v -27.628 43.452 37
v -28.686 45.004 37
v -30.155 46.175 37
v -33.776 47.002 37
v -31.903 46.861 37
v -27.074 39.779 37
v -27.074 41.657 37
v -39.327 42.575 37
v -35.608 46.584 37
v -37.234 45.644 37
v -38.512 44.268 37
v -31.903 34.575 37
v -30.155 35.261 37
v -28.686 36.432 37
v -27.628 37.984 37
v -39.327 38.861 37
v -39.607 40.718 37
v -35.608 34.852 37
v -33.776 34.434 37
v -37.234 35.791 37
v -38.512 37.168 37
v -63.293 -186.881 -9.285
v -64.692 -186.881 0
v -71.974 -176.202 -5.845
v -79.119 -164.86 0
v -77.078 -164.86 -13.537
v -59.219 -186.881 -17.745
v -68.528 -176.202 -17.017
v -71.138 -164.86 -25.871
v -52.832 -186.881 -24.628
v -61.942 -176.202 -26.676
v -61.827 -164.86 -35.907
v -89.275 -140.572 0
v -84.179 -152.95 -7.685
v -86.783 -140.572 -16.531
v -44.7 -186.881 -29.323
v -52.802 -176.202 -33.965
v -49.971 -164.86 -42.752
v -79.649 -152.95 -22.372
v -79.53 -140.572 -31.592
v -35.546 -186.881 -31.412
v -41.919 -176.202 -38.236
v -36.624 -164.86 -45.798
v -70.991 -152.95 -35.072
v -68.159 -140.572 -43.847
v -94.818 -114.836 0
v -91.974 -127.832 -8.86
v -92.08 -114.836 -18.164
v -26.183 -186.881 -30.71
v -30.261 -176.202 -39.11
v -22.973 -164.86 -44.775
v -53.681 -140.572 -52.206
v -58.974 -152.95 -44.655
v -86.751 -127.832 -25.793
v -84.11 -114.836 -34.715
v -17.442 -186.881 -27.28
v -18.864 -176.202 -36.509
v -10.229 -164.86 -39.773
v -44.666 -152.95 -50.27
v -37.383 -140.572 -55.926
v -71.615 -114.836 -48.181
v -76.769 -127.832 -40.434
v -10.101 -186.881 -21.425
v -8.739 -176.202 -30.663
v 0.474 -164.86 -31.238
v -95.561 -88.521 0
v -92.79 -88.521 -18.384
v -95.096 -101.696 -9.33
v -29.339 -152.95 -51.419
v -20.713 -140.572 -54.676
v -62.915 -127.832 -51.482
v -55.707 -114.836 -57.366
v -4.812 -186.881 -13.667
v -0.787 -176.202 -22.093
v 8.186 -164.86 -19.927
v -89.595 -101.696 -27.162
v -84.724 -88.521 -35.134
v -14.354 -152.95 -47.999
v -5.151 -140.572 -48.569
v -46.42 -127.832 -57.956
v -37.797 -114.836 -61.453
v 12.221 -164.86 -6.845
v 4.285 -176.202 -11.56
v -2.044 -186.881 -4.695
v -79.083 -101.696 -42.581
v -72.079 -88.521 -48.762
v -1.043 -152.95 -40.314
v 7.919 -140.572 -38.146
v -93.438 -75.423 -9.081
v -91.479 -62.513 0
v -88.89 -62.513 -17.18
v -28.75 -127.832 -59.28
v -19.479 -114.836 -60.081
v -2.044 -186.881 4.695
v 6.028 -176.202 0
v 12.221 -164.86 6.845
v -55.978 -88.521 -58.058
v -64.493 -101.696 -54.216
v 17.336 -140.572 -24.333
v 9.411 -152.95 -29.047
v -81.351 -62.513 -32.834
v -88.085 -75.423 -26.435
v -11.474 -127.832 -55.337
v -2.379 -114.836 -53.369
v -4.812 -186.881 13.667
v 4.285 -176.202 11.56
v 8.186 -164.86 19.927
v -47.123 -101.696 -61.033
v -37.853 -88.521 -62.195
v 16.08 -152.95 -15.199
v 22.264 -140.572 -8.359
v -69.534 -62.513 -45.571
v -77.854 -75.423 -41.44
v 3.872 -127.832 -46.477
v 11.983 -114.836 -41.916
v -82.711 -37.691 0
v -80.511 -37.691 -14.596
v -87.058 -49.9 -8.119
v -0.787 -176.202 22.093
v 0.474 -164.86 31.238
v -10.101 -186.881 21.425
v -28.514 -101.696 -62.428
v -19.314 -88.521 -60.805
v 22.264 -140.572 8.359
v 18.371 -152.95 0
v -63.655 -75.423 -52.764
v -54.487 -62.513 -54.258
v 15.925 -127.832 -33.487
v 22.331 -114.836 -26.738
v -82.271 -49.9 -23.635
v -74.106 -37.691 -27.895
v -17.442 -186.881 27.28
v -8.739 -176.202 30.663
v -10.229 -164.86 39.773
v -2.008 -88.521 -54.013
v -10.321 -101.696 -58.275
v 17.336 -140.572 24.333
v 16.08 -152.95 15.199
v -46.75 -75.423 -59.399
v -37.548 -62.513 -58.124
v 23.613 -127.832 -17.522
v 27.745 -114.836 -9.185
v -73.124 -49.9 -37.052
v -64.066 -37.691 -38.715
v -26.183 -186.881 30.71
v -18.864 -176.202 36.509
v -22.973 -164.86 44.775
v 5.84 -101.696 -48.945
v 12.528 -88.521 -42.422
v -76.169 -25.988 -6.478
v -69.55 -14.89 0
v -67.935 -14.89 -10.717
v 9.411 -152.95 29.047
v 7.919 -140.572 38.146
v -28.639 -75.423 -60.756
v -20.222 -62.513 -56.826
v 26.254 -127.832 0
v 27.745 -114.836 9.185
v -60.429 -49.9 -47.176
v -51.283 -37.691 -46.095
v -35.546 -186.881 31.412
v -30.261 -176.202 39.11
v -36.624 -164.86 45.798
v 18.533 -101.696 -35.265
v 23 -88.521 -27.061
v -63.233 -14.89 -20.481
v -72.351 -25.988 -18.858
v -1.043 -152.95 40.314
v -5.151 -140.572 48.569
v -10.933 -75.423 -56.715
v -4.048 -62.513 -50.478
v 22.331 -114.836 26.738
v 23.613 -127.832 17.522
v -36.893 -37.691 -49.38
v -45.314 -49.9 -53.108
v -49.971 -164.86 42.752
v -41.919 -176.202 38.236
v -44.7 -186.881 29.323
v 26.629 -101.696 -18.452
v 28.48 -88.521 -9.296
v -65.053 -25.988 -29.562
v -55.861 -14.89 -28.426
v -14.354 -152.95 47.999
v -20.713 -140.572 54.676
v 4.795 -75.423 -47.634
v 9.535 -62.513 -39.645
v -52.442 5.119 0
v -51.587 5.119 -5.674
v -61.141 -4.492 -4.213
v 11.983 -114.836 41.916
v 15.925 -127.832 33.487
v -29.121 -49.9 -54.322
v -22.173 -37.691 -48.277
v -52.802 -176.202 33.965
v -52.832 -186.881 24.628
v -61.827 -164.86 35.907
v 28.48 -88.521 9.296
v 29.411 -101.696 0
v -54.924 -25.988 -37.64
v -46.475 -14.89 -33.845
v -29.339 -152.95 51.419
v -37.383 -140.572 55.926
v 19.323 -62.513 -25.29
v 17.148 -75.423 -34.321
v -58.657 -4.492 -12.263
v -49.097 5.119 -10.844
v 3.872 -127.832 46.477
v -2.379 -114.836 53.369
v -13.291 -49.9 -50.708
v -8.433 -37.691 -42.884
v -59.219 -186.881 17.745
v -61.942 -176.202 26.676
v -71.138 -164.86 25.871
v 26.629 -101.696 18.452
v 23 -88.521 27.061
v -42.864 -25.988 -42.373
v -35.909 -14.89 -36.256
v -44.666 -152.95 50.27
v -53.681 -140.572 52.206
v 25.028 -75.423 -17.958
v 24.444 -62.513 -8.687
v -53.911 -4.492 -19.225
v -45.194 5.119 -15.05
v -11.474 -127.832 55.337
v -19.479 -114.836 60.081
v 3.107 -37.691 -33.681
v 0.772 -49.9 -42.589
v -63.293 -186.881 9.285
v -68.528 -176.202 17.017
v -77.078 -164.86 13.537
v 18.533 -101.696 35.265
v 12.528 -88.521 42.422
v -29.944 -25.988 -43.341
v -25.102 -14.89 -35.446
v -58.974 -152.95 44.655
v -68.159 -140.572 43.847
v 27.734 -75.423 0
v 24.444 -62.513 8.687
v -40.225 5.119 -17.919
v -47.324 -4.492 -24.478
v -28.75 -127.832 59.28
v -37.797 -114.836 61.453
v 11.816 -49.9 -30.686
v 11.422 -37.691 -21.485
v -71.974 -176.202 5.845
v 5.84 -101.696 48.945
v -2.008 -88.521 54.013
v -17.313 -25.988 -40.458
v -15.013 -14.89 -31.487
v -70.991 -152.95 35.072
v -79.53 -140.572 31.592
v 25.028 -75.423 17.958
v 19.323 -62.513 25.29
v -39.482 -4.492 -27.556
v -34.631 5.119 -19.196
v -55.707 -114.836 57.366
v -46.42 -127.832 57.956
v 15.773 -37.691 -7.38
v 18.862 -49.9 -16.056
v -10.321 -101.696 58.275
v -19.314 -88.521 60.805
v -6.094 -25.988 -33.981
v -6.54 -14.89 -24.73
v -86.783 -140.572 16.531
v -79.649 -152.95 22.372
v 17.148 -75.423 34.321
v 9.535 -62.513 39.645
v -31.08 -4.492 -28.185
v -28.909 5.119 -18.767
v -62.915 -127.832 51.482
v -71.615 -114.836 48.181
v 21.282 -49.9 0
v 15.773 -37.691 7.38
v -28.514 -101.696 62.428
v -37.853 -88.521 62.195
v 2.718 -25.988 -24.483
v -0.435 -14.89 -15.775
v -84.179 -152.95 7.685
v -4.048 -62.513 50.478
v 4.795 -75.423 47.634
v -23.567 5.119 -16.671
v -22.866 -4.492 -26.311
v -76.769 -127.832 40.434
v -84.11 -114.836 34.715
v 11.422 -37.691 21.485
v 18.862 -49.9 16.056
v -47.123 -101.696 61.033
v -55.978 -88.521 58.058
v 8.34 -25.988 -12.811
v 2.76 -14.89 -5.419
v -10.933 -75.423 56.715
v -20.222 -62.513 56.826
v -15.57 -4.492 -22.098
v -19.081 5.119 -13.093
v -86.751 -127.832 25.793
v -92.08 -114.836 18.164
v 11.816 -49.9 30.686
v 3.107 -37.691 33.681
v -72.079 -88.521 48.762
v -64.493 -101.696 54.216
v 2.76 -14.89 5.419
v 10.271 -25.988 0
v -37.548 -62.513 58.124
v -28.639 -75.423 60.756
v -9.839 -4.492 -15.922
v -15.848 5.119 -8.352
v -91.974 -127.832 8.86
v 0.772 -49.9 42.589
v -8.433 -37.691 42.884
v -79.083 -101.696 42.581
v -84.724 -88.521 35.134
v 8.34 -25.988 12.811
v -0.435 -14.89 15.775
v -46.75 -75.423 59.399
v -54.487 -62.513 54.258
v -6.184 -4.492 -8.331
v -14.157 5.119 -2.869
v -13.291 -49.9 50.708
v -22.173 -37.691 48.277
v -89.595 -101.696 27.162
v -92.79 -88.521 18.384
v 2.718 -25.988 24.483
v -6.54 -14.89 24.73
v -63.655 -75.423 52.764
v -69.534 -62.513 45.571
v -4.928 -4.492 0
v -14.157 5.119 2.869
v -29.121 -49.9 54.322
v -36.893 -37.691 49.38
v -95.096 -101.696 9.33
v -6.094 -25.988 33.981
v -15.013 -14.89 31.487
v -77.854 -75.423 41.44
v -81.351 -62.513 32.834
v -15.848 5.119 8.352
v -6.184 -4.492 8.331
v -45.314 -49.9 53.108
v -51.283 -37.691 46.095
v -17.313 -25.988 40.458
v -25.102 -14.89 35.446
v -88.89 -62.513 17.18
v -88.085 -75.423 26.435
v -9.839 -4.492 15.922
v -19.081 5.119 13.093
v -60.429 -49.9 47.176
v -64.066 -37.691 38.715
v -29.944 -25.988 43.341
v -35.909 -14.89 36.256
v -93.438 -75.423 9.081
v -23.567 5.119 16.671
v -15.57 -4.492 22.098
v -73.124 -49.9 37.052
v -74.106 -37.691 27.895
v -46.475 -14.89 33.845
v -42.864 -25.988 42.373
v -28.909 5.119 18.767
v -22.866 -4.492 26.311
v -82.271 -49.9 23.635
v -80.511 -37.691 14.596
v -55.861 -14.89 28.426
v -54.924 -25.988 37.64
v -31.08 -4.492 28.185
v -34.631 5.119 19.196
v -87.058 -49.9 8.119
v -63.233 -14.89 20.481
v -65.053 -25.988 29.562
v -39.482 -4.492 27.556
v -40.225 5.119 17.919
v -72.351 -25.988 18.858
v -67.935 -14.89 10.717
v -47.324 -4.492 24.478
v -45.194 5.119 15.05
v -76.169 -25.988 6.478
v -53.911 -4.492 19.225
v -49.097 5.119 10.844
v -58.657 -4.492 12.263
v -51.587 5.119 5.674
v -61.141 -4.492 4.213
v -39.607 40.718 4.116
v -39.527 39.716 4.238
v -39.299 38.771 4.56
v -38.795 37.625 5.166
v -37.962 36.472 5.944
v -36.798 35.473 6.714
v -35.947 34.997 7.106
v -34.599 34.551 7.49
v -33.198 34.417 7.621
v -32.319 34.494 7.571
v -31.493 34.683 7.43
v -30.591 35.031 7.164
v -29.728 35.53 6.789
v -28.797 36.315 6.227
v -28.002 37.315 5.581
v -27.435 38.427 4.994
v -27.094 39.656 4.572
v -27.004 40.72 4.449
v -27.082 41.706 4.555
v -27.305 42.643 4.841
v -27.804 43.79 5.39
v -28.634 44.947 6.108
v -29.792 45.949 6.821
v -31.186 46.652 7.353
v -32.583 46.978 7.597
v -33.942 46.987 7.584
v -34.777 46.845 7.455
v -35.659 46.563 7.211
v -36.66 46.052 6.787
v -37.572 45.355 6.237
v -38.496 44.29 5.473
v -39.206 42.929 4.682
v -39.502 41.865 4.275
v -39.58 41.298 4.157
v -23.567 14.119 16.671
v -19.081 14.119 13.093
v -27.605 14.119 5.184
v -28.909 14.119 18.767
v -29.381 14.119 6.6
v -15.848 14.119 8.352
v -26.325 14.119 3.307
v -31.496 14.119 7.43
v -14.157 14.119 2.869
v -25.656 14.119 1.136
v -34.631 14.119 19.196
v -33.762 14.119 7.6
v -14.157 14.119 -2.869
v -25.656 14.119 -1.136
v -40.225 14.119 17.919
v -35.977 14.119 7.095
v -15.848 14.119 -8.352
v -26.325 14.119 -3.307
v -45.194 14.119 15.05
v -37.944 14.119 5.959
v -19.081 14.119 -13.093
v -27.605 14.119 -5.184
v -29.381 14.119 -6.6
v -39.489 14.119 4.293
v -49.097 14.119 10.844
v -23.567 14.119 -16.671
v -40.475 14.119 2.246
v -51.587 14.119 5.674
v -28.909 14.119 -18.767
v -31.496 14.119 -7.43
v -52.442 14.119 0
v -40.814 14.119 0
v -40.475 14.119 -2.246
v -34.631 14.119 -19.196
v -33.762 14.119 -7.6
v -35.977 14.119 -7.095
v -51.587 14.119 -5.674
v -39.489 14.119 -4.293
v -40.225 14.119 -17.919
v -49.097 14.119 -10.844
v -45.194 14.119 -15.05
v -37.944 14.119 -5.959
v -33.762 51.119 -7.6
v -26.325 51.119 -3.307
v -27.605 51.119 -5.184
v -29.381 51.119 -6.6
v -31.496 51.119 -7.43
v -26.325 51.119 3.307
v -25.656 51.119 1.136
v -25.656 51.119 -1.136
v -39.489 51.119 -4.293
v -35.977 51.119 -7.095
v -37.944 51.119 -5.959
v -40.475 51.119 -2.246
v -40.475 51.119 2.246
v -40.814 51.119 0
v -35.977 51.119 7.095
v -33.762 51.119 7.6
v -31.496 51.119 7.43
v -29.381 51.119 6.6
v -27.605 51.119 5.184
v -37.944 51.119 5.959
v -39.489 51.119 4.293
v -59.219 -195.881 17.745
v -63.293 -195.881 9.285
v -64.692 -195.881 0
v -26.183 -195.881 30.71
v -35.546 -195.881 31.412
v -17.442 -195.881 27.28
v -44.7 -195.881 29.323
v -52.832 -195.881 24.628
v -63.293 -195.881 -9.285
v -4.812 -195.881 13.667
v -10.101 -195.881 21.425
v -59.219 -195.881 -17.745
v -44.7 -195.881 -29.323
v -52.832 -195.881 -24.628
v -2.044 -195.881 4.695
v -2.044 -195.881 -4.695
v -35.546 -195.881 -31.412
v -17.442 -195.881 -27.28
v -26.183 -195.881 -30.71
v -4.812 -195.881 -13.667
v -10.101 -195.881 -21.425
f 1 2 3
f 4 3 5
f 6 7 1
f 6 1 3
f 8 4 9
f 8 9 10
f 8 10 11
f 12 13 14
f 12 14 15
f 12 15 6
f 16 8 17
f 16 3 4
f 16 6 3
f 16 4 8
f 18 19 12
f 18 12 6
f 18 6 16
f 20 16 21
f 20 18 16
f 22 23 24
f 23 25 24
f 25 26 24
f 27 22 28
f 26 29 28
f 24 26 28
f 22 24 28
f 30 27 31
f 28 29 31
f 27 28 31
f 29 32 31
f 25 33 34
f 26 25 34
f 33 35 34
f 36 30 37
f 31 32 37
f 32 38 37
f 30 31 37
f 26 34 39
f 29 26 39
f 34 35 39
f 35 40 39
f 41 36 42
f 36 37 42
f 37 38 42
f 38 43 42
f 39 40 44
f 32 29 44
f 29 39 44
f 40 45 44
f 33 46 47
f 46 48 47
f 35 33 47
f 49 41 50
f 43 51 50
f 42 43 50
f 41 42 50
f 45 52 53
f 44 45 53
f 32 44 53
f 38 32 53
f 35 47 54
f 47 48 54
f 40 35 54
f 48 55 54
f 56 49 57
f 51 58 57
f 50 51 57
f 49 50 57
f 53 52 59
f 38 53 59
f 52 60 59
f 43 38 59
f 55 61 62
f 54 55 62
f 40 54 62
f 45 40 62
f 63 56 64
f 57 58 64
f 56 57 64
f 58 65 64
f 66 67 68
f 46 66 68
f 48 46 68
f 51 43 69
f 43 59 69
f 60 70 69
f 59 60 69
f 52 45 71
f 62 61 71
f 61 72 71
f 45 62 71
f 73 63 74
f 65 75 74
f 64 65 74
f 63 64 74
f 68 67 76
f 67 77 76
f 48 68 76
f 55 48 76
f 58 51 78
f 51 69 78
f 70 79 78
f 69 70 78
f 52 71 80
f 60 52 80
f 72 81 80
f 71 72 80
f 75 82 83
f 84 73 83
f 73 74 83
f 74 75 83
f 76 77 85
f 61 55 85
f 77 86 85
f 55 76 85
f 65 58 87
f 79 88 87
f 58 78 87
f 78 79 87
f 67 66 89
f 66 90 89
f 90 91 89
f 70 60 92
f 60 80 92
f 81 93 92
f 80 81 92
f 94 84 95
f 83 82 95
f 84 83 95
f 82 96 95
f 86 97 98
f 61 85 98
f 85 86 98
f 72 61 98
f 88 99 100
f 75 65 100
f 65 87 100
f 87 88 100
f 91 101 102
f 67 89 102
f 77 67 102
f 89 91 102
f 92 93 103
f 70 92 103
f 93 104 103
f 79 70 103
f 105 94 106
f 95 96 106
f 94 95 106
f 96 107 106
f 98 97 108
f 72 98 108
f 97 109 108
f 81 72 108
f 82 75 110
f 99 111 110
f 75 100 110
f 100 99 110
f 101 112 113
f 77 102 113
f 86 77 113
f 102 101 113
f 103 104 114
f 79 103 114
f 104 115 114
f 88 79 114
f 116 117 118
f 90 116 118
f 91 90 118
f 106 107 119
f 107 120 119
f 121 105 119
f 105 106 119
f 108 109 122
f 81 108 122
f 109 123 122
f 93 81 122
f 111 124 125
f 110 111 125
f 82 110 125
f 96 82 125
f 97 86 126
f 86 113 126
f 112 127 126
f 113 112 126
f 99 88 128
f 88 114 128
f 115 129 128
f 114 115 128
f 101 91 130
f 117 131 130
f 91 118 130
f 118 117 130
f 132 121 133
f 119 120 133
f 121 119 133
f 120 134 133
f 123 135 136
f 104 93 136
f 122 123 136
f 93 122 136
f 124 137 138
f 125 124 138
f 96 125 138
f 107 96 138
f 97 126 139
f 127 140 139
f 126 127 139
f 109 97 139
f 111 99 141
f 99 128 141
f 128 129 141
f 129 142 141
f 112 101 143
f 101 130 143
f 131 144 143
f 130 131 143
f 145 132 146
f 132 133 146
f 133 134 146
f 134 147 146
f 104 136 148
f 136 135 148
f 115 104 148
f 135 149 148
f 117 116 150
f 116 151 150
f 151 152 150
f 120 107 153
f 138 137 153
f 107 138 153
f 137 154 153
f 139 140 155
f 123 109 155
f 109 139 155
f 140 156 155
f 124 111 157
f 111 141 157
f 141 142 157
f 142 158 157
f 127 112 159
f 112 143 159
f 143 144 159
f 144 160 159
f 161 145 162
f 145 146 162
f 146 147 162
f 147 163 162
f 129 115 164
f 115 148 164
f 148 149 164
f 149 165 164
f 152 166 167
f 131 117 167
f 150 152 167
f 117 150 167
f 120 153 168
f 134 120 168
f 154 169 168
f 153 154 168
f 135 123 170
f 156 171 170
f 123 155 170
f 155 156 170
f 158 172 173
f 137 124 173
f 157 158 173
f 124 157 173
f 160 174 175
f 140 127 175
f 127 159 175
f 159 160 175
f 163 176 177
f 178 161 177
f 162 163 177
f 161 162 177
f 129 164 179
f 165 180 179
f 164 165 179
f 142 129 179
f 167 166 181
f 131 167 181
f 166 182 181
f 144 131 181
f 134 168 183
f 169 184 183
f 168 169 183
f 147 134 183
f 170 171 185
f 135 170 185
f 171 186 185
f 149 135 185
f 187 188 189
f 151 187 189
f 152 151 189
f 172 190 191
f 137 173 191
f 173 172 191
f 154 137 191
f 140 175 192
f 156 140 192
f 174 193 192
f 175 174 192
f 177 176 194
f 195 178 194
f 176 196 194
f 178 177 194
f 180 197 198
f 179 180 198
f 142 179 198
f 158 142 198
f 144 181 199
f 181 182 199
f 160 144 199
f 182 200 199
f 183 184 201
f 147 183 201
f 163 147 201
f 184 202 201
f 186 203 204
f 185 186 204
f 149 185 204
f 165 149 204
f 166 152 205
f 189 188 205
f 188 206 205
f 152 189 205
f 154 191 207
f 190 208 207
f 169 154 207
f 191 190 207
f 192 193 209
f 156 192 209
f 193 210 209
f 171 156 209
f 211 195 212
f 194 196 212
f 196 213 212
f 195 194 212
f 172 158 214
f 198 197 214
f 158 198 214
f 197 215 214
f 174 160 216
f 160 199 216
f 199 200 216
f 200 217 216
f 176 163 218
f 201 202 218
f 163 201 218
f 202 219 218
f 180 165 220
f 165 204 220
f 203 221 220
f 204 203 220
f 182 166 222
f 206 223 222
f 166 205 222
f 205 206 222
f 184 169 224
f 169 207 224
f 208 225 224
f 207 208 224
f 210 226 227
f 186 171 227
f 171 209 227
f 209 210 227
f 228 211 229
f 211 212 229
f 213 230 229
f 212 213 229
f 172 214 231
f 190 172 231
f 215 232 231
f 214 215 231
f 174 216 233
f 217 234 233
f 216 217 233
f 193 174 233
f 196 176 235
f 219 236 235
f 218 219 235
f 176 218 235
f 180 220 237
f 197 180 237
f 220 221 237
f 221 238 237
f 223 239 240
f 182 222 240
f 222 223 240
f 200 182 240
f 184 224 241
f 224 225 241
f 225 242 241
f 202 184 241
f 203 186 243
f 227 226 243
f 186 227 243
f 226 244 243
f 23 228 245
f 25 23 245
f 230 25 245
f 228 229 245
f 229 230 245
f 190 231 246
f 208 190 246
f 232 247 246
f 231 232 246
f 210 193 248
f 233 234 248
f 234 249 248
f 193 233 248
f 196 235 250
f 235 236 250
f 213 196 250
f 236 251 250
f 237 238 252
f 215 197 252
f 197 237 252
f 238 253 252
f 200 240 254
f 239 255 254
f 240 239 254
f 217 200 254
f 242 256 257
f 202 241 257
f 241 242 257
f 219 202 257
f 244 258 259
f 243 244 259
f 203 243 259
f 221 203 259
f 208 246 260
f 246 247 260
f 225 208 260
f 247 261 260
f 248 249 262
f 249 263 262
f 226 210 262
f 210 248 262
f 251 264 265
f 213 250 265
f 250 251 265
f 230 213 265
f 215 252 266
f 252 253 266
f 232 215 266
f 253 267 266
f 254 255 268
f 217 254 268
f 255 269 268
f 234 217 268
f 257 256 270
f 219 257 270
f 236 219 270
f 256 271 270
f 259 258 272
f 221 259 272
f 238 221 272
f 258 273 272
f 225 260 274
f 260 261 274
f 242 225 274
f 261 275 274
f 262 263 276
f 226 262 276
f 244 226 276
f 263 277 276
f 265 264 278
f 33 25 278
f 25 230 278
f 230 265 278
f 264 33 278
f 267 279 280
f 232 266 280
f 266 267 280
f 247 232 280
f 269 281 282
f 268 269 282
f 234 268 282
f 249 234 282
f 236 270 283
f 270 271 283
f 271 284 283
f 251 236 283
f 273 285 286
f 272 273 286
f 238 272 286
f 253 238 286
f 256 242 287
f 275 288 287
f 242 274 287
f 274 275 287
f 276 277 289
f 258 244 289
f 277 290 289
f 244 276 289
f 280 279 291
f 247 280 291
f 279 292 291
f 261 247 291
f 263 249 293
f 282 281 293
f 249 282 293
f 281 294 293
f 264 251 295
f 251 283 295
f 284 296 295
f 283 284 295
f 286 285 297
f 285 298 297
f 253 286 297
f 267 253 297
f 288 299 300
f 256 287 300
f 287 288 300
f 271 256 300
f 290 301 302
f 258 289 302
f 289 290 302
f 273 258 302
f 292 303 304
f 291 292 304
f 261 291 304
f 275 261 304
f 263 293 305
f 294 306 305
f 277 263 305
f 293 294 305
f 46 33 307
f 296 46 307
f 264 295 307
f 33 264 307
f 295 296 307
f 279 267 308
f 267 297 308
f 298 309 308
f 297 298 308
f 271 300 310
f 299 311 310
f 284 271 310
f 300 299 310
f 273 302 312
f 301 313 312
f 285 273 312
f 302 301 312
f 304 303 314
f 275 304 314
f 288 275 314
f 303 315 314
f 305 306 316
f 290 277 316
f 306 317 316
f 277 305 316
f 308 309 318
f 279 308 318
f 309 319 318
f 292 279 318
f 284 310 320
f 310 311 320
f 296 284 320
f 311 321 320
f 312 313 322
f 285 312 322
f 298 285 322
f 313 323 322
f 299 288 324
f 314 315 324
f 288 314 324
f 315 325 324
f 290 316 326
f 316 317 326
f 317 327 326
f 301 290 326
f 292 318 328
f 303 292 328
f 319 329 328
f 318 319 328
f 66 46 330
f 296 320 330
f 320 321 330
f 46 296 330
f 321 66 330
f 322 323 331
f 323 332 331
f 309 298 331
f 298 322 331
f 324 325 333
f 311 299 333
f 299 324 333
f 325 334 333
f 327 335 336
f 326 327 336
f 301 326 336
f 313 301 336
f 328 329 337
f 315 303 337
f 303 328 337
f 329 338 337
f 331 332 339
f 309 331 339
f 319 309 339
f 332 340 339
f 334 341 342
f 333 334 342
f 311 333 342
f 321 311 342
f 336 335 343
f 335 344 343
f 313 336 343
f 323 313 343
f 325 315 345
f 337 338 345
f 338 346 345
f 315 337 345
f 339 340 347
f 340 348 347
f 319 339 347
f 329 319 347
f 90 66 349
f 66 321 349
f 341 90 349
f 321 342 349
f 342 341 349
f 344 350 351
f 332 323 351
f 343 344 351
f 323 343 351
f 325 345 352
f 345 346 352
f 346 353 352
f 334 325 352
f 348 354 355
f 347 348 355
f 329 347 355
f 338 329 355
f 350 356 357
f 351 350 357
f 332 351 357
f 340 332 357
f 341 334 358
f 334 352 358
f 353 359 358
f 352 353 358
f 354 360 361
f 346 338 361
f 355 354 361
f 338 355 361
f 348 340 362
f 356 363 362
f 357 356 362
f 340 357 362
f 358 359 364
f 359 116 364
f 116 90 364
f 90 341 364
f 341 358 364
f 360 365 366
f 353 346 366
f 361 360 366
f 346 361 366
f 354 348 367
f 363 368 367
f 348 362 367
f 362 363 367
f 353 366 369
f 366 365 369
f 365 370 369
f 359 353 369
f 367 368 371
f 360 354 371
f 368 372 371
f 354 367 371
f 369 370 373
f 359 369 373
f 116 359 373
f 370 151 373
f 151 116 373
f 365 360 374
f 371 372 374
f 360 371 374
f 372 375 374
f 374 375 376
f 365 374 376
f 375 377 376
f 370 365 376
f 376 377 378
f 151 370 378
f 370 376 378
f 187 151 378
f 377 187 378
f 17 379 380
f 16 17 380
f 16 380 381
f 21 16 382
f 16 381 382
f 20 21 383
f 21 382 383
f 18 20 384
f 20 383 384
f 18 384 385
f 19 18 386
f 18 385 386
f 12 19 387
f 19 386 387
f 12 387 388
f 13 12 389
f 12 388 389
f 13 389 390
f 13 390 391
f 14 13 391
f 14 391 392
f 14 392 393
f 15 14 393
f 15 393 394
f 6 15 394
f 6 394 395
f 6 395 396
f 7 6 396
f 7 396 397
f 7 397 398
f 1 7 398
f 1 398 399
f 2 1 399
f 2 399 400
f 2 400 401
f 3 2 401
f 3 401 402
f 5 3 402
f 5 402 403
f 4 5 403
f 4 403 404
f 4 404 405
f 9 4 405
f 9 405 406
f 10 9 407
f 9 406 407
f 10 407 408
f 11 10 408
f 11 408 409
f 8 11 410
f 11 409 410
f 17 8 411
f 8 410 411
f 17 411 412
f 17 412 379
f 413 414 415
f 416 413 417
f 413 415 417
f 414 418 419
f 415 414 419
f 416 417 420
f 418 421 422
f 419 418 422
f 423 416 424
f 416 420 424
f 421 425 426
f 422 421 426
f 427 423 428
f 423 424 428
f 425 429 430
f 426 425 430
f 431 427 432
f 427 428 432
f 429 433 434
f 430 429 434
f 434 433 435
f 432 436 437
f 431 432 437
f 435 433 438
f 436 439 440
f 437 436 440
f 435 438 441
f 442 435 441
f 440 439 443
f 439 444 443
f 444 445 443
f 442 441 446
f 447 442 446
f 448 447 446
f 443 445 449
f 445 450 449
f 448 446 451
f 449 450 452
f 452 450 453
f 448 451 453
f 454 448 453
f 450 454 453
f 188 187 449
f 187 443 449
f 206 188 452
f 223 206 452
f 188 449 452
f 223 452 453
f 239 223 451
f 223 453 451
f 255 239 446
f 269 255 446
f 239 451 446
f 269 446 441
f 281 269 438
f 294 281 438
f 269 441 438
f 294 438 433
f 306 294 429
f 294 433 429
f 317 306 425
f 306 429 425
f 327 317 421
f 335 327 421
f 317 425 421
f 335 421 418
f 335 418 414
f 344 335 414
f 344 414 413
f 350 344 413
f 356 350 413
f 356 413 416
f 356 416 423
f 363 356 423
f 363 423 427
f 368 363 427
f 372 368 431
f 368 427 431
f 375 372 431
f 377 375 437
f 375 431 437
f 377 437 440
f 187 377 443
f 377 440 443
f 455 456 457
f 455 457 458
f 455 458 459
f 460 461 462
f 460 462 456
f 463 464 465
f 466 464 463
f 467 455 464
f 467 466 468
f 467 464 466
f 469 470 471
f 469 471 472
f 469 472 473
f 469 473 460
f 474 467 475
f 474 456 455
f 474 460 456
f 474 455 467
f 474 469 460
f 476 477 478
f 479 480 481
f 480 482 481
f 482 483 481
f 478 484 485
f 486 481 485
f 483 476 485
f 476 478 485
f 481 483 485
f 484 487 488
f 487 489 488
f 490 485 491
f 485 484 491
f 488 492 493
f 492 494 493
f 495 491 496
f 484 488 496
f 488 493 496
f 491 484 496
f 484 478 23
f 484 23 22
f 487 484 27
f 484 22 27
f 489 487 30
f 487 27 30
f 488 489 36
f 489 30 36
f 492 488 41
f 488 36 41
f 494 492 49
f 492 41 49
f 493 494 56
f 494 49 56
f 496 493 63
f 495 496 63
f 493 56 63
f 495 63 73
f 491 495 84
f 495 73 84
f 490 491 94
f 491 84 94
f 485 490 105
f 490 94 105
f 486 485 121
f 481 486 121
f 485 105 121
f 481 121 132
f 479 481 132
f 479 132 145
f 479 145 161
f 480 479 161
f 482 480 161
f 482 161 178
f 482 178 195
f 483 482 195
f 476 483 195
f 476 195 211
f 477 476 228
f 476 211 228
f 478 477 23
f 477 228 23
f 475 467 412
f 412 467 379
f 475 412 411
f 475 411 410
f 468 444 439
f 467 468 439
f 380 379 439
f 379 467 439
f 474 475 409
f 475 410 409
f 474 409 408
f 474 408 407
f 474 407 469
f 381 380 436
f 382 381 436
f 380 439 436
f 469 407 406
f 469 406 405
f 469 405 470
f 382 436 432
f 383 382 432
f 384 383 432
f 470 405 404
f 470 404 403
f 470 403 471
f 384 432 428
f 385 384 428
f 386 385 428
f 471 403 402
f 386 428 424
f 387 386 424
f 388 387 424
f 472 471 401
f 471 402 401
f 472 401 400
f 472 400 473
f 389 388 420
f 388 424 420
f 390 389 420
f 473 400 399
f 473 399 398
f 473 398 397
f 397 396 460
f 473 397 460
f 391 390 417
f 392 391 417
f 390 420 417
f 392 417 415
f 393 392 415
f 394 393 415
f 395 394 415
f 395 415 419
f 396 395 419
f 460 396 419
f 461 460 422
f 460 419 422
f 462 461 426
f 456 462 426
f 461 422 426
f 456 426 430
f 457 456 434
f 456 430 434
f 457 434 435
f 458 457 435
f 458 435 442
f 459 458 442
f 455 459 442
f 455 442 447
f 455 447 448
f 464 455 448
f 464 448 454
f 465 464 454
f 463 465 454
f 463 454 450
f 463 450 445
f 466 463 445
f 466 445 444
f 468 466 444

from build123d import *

# Parameters (mm, degrees)
SKETCH2_R           = 7.621417702
BOSS_EXTRUDE1_DEPTH = 37
SKETCH3_R           = 6.301348683
BOSS_EXTRUDE2_DEPTH = 37


with BuildPart() as part:
    # Sketch1 → Revolve1 (revolve)
    with BuildSketch(Plane.XY, mode=Mode.PRIVATE) as revolve1_sk:
        with BuildLine():
            Line((-13.94213087, 14.118857143), (-33.19213087, 14.118857143))
            Line((-33.19213087, 14.118857143), (-33.19213087, 5.118857143))
            Line((-33.19213087, 5.118857143), (-33.19213087, -186.881142857))
            Line((-33.19213087, -186.881142857), (-33.19213087, -195.881142857))
            Line((-33.19213087, -195.881142857), (-1.69213087, -195.881142857))
            Line((-1.69213087, -195.881142857), (-1.69213087, -186.881142857))
            ThreePointArc((-1.69213087, -186.881142857), (29.176808752, -88.520852439), (-13.94213087, 5.118857143))
            Line((-13.94213087, 5.118857143), (-13.94213087, 14.118857143))
        make_face()
    revolve(revolve1_sk.sketch.rotate(Axis((-33.19213087, 5.118857143, 0), (0, -1, 0)), 180), axis=Axis((-33.19213087, 5.118857143, 0), (0, -1, 0)))

    # Sketch2 → Boss-Extrude1 (add)
    with BuildSketch(Plane(origin=(0, 14.118857143, 0), x_dir=(1, 0, 0), z_dir=(0, 1, 0))):
        with Locations(Location((-33.19213087, 0, 0), (0, 0, 180))):
            Circle(SKETCH2_R)
    extrude(amount=BOSS_EXTRUDE1_DEPTH)

    # Sketch3 → Boss-Extrude2 (add)
    with BuildSketch(Plane.XY):
        with Locations(Location((-33.305381498, 40.717884654, 0), (0, 0, 180))):
            Circle(SKETCH3_R)
    extrude(amount=BOSS_EXTRUDE2_DEPTH)


solid = part.part
